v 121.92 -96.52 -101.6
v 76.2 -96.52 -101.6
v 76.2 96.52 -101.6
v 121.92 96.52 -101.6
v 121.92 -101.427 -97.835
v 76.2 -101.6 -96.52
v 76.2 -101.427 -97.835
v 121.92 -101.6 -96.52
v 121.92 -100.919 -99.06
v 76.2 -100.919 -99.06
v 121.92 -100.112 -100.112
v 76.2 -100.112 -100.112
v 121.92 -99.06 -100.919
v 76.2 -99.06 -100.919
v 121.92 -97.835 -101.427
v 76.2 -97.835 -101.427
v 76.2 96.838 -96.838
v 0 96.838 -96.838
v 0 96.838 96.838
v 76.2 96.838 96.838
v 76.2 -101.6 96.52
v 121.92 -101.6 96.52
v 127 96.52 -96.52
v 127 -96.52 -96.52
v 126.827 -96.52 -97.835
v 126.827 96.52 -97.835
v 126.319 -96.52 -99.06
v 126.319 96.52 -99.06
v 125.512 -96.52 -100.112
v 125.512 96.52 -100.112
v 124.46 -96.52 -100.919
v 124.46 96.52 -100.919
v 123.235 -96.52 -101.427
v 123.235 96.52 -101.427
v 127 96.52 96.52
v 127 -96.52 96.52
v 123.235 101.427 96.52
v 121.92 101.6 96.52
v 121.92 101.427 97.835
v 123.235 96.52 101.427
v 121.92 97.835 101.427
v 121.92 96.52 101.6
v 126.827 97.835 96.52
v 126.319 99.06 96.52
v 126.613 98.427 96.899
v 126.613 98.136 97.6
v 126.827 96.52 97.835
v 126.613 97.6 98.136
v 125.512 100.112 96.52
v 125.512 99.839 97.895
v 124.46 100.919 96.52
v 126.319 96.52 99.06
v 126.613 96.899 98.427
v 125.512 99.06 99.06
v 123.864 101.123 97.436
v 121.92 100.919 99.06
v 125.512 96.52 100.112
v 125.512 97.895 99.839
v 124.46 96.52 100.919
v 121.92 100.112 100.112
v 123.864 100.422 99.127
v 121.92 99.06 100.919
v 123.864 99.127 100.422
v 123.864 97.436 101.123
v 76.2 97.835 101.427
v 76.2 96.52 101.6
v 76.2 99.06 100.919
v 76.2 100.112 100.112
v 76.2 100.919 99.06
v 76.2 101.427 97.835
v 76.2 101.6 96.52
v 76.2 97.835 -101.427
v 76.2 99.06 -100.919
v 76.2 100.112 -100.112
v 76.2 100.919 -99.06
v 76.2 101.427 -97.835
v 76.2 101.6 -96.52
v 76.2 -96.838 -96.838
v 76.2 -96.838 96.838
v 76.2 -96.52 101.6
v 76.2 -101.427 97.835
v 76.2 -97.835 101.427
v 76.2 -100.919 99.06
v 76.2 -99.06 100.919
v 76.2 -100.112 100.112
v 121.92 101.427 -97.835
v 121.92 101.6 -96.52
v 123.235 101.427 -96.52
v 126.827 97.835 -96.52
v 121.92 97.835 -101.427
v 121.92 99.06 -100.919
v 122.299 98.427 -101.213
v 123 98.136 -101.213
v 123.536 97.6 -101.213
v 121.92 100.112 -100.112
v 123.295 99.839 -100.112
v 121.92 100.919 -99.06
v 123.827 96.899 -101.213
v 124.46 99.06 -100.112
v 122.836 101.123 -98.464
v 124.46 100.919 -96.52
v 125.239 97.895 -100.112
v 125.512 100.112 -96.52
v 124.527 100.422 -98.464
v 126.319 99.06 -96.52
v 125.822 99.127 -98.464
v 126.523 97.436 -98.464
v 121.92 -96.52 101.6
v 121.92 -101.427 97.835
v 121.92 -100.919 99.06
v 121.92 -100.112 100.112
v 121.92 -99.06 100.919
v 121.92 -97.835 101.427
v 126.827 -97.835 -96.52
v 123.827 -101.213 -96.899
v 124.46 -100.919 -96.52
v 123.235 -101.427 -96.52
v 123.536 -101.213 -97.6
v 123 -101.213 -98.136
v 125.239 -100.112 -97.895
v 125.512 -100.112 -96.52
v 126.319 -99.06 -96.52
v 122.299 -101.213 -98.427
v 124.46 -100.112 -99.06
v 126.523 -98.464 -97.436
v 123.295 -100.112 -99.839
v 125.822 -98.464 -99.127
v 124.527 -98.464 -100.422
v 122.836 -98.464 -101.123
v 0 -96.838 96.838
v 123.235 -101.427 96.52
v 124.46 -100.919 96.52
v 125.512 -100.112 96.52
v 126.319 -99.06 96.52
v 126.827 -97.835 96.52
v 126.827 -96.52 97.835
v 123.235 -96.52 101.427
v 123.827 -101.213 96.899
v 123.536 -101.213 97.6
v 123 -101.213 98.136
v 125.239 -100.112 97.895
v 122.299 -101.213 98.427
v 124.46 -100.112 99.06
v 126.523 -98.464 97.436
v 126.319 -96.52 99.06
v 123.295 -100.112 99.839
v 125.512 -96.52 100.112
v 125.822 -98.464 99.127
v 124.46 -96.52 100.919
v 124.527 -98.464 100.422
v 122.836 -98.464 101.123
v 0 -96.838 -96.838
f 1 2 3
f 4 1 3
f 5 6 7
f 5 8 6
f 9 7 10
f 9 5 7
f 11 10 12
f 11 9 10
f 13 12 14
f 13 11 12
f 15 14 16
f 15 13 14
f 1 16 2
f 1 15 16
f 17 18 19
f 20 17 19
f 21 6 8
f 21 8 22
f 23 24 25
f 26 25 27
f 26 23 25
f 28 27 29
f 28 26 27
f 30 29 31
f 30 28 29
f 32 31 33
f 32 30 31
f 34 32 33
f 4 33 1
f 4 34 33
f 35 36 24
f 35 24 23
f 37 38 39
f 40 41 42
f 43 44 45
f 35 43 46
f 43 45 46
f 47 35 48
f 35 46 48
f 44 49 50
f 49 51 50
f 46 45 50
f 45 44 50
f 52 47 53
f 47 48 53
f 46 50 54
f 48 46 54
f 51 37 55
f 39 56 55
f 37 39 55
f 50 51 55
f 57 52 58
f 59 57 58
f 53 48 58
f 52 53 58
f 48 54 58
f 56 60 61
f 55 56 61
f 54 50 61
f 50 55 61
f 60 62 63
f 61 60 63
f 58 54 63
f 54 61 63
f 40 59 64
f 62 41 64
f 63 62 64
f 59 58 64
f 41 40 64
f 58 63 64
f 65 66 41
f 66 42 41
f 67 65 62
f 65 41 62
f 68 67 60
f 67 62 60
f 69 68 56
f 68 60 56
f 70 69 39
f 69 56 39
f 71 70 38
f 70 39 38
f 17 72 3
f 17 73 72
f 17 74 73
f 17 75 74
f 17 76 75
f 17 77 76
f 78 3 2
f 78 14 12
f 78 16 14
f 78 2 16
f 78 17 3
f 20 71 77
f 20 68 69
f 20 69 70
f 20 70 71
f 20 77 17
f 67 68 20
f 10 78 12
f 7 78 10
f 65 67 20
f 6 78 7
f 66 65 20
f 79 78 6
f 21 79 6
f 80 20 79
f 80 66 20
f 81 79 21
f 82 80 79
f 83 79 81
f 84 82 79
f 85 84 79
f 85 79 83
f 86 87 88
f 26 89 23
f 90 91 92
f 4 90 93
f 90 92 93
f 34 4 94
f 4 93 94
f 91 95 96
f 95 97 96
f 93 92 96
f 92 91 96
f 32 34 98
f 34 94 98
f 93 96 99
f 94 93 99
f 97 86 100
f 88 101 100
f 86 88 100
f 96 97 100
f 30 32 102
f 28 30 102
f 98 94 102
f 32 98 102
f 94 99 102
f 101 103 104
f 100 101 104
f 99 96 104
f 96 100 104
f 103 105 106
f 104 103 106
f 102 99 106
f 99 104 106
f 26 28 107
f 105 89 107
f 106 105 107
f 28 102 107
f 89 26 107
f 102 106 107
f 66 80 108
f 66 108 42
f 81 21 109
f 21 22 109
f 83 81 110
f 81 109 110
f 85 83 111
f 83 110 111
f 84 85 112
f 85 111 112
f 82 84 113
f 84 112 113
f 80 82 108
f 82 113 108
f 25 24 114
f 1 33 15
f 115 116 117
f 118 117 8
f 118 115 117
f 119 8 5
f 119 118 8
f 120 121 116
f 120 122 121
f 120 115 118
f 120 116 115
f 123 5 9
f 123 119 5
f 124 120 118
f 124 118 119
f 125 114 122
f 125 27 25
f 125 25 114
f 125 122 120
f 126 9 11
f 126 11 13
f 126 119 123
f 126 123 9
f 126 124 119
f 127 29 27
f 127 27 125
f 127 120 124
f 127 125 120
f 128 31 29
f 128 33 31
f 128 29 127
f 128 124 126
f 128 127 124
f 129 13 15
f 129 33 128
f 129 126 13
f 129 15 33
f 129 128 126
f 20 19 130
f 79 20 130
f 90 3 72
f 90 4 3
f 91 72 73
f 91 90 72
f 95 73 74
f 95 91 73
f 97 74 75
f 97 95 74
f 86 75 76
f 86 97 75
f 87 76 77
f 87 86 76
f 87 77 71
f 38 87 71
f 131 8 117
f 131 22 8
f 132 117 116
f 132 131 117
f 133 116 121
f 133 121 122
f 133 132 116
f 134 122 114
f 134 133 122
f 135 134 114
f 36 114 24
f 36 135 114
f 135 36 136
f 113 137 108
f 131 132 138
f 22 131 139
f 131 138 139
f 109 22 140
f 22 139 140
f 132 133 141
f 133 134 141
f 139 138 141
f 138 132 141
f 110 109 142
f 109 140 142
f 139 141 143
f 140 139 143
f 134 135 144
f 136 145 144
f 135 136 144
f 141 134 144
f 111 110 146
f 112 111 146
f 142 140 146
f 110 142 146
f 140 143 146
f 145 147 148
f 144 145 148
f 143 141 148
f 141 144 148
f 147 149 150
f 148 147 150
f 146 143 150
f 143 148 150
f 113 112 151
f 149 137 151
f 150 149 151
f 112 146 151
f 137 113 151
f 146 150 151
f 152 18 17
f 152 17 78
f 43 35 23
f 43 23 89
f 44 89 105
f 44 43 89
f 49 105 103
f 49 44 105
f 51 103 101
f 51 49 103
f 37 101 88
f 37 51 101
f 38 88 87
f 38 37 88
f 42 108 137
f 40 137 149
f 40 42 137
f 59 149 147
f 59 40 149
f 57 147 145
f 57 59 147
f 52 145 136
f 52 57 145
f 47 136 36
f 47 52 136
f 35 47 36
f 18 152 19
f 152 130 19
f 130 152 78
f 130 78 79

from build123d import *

# Parameters (mm, degrees)
F0_W     = 203.2
F0_H     = 203.2
F1_DEPTH = 127
F2_W     = 203.2
F2_H     = 203.2
F2_W_2   = 193.675
F2_H_2   = 193.675
F3_DEPTH = 76.2
F4_R     = 5.08


with BuildPart() as f1:
    # F0 (on Right) → F1 (new body)
    with BuildSketch(Plane.YZ):
        Rectangle(F0_W, F0_H)
    extrude(amount=F1_DEPTH)

    # F2 (on face) → F3 (cut)
    with BuildSketch(Plane(origin=(0, 0, 0), x_dir=(0, -1, 0), z_dir=(-1, 0, 0))):
        Rectangle(F2_W, F2_H)
        Rectangle(F2_W_2, F2_H_2, mode=Mode.SUBTRACT)
    extrude(amount=-F3_DEPTH, mode=Mode.SUBTRACT)

    # F4
    f4_edges = [f1.edges().sort_by_distance(p)[0] for p in [
        (101.6, 101.6, 101.6),
        (127, 101.6, 0),
        (101.6, 101.6, -101.6),
        (127, 0, -101.6),
        (127, 0, 101.6),
        (127, -101.6, 0),
        (101.6, -101.6, 101.6),
        (101.6, -101.6, -101.6),
    ]]
    fillet(f4_edges, radius=F4_R)


solid = f1.part
